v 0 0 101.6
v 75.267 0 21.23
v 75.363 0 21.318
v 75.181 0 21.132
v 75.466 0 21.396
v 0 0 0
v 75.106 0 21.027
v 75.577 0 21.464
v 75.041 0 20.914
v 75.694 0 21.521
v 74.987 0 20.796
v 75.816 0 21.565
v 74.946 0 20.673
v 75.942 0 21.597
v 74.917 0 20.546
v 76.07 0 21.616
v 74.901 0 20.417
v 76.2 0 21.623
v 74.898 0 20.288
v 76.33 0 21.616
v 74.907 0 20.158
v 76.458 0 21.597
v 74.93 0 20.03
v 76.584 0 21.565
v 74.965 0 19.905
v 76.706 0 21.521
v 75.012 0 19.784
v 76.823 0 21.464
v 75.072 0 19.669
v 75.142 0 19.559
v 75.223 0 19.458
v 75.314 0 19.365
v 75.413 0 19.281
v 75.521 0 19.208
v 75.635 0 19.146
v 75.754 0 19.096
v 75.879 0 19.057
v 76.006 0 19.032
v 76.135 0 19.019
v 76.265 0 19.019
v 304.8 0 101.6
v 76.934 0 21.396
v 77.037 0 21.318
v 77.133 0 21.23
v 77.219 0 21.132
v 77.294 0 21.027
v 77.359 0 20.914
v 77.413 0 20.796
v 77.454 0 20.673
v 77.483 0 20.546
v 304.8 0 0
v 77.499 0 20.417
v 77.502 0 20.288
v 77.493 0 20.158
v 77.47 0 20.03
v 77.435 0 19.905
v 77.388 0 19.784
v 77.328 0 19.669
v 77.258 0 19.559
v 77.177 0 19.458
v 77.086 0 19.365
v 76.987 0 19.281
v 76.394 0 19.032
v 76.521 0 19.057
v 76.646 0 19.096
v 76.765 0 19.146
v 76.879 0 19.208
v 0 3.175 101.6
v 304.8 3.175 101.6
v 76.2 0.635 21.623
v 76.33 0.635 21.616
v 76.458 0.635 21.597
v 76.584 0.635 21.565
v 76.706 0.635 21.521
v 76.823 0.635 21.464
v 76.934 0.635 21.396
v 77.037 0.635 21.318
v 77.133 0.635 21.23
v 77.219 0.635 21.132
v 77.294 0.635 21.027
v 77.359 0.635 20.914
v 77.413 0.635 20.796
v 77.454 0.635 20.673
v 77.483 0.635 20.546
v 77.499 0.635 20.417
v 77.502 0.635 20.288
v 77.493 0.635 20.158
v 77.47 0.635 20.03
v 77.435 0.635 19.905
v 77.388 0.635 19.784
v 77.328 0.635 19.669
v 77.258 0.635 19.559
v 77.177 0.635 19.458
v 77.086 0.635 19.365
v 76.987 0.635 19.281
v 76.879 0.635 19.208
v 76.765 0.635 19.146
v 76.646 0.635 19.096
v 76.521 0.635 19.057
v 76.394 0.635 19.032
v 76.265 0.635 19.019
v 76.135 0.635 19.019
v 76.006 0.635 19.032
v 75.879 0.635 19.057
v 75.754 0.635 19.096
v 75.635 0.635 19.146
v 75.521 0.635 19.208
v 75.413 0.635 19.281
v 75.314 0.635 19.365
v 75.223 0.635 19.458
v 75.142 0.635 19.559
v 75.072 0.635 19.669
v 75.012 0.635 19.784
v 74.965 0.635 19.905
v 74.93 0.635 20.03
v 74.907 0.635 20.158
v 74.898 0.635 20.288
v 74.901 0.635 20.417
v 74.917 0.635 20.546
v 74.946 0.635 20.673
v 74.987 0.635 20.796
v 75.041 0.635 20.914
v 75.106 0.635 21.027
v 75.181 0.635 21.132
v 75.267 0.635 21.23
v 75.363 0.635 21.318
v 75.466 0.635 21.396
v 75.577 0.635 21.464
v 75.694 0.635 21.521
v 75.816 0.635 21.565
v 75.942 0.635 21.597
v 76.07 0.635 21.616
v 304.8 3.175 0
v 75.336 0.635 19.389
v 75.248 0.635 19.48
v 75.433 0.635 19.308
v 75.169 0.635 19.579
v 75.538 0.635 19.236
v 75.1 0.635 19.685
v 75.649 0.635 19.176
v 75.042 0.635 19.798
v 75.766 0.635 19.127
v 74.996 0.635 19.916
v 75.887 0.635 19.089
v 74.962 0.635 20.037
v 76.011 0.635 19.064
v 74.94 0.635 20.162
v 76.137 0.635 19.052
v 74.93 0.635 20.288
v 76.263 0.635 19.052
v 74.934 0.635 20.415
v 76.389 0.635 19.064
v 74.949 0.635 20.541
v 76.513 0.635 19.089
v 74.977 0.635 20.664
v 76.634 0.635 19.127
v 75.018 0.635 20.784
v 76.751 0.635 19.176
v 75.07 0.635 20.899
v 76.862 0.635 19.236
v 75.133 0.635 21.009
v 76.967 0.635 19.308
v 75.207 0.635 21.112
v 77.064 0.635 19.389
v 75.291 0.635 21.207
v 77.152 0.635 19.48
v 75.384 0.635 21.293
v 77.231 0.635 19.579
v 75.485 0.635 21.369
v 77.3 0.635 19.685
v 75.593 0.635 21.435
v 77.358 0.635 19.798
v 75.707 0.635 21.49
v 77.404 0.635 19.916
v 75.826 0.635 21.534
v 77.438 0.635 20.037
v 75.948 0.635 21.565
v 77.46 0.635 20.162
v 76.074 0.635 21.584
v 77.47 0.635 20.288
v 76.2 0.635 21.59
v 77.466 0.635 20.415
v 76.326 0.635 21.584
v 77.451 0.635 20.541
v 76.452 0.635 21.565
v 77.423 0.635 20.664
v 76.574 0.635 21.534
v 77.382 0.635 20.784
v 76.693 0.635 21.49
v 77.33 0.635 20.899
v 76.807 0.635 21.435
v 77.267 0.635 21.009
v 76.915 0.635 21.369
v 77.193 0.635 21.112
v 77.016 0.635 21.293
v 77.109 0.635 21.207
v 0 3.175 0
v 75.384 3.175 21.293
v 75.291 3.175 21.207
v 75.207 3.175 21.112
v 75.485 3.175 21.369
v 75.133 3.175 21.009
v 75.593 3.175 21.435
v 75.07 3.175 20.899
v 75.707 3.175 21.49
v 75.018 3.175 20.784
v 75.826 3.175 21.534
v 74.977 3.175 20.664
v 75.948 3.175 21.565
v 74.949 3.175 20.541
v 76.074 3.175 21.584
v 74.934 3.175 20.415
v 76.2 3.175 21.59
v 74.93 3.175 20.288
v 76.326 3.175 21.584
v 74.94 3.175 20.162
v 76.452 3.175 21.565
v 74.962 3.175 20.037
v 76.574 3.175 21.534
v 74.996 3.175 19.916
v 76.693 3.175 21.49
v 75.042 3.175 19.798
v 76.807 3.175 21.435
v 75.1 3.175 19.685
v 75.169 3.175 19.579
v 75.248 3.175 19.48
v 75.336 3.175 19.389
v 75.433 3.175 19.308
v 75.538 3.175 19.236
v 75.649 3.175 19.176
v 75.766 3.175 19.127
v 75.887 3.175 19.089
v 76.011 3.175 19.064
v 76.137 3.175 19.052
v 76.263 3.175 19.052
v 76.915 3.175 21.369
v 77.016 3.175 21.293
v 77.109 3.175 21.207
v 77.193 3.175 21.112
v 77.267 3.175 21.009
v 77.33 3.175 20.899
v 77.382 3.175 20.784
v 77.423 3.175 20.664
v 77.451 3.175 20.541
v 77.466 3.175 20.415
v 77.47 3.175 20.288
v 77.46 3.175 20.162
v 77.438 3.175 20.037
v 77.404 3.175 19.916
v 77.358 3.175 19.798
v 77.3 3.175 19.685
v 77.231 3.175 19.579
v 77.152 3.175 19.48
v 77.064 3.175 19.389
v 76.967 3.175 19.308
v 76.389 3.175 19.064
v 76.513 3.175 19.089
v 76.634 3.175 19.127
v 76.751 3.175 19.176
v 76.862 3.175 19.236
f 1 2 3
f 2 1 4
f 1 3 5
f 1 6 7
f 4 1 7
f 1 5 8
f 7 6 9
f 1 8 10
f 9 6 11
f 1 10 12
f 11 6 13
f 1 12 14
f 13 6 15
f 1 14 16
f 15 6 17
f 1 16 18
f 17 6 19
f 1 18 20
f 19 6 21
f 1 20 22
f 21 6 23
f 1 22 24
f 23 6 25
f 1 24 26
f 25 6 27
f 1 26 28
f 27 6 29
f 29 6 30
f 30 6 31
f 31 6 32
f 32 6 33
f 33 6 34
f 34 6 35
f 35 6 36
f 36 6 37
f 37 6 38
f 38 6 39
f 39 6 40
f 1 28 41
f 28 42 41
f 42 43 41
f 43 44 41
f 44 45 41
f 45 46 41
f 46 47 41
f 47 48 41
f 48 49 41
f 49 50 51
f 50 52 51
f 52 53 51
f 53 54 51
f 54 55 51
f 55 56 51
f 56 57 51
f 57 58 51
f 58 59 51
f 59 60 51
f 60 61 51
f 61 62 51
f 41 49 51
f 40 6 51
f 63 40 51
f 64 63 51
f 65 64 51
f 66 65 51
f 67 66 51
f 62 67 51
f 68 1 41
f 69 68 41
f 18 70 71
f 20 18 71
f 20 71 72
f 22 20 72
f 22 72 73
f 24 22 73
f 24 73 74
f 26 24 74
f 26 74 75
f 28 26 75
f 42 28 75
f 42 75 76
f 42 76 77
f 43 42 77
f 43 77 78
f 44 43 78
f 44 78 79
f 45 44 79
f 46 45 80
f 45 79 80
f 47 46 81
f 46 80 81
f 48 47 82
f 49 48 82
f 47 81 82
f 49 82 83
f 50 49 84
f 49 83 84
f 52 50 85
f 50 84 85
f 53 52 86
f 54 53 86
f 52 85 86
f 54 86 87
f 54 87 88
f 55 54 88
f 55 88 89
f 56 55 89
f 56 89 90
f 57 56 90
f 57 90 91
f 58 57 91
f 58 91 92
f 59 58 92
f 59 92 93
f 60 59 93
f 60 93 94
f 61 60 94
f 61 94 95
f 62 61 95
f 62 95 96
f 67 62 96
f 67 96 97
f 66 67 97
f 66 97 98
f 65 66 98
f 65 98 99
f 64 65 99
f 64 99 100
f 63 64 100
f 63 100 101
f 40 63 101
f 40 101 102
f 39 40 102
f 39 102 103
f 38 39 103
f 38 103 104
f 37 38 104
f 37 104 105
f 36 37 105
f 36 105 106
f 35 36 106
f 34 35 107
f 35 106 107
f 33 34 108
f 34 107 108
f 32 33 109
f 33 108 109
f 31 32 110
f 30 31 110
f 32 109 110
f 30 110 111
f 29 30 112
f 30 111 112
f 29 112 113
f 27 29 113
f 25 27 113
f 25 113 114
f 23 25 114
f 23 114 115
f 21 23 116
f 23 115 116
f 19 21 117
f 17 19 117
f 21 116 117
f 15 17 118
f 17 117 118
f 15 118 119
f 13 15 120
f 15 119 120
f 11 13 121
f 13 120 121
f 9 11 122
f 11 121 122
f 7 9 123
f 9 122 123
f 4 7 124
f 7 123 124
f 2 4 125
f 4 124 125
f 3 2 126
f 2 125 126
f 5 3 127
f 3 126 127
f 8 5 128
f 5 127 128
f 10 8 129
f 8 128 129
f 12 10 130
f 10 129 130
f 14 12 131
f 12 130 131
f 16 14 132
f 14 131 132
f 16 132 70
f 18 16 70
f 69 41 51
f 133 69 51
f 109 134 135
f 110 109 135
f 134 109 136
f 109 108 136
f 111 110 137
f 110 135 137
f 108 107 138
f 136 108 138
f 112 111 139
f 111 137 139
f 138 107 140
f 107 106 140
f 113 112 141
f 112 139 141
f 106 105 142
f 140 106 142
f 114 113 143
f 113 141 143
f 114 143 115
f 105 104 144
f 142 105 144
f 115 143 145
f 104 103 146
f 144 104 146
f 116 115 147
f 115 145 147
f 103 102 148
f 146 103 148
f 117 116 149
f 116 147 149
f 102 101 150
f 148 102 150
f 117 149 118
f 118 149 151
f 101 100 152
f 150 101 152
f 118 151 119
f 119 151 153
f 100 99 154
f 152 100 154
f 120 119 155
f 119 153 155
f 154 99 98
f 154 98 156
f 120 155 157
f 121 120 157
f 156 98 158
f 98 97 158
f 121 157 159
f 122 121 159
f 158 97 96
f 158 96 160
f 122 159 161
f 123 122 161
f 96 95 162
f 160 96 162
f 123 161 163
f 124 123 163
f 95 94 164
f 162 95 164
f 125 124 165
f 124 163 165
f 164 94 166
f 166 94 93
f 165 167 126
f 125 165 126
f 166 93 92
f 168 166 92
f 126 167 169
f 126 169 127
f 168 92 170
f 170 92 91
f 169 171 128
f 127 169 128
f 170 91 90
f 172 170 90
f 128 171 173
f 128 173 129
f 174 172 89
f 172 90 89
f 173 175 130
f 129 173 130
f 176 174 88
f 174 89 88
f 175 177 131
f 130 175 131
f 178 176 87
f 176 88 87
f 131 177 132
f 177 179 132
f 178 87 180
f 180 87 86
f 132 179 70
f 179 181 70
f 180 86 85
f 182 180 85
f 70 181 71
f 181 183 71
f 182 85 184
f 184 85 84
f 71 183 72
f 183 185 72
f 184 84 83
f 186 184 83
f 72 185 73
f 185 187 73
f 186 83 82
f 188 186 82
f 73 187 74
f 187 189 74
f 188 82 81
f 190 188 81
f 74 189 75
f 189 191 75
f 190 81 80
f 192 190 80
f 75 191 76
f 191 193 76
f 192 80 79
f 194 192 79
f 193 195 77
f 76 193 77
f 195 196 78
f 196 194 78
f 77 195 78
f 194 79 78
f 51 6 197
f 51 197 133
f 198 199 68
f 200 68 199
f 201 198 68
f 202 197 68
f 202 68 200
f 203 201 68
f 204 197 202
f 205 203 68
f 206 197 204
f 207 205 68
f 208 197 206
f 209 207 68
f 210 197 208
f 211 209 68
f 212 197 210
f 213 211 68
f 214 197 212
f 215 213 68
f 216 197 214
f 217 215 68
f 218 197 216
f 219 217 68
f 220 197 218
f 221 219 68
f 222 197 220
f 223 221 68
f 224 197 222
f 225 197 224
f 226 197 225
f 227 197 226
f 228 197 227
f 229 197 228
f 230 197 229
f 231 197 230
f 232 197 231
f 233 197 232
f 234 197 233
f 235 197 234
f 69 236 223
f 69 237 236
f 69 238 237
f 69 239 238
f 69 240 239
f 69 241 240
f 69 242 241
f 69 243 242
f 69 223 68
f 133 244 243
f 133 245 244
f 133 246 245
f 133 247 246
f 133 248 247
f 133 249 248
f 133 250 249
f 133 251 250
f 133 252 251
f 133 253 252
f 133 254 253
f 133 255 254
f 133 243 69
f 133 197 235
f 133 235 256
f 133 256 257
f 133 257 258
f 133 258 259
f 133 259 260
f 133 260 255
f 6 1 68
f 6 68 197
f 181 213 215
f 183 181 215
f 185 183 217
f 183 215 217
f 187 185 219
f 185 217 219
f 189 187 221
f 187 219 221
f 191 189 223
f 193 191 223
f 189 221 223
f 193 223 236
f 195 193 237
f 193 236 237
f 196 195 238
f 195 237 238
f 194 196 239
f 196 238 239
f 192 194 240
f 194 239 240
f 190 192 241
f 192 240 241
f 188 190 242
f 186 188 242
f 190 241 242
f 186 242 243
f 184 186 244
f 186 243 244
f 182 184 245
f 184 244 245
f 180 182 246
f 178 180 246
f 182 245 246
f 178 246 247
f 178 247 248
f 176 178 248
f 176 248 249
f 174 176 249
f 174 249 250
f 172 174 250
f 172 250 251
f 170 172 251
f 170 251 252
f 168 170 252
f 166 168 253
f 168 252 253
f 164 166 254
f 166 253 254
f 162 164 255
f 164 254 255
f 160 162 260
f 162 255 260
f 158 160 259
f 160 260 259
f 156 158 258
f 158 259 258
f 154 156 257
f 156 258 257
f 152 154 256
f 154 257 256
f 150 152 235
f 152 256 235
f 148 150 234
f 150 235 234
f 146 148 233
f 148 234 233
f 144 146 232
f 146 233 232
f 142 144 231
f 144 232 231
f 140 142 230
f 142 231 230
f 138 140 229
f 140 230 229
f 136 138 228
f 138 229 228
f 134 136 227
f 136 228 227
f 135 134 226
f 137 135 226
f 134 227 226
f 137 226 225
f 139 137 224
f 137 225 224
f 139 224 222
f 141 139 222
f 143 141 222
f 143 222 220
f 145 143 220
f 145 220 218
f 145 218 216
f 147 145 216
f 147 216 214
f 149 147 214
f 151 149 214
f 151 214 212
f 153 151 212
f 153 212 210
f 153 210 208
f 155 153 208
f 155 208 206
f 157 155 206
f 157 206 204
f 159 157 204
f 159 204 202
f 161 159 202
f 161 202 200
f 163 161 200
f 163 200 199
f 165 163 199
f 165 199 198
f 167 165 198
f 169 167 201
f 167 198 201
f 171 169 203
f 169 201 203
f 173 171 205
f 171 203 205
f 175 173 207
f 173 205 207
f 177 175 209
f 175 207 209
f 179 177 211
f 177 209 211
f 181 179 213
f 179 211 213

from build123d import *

# Parameters (mm, degrees)
SKETCH1_W           = 304.8
SKETCH1_H           = 101.6
BOSS_EXTRUDE1_DEPTH = 3.175
SKETCH3_R           = 1.27
CUT_EXTRUDE1_DEPTH  = 2.54
SKETCH4_R           = 1.302859954
CUT_EXTRUDE2_DEPTH  = 12.7


with BuildPart() as part:
    # Sketch1 → Boss-Extrude1 (new body)
    with BuildSketch(Plane(origin=(0, 0, 0), x_dir=(1, 0, 0), z_dir=(0, 1, 0))):
        with Locations((152.4, -50.8)):
            Rectangle(SKETCH1_W, SKETCH1_H)
    extrude(amount=BOSS_EXTRUDE1_DEPTH)

    # Sketch3 → Cut-Extrude1 (cut)
    with BuildSketch(Plane(origin=(0, 3.175, 0), x_dir=(1, 0, 0), z_dir=(0, 1, 0))):
        with Locations(Location((76.2, -20.32, 0), (0, 0, 270))):
            Circle(SKETCH3_R)
    extrude(amount=-CUT_EXTRUDE1_DEPTH, mode=Mode.SUBTRACT)

    # Sketch4 → Cut-Extrude2 (cut)
    with BuildSketch(Plane(origin=(0, 0.635, 0), x_dir=(1, 0, 0), z_dir=(0, 1, 0))):
        with Locations(Location((76.2, -20.32, 0), (0, 0, 270))):
            Circle(SKETCH4_R)
    extrude(amount=-CUT_EXTRUDE2_DEPTH, mode=Mode.SUBTRACT)


solid = part.part
